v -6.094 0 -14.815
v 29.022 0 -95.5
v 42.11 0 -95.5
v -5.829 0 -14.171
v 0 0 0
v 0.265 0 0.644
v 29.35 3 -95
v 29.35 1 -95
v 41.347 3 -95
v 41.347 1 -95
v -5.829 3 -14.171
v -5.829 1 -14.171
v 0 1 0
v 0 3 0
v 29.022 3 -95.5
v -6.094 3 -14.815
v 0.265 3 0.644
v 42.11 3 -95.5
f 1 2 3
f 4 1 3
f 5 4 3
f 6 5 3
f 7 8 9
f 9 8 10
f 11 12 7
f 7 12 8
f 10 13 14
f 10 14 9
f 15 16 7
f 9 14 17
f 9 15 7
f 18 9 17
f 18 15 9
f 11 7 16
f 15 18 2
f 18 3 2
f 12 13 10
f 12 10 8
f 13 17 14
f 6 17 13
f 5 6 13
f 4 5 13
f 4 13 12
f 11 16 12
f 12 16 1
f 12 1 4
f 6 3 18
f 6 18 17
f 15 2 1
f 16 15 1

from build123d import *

# Parameters (mm, degrees)
EXTRUDE_1_DEPTH      = 1
EXTRUDE_2_DEPTH      = 2
EXTRUDE_2_DEPTH_BACK = 1
EXTRUDE_4_DEPTH      = 2
EXTRUDE_4_DEPTH_BACK = 1
EXTRUDE_5_DEPTH      = 2


with BuildPart() as part:
    # 草圖1 → 填料-伸長1 (new body)
    with BuildSketch(Plane(origin=(0, 0, 0), x_dir=(1, 0, 0), z_dir=(0, 1, 0))):
        Polygon((0, 0), (-5.8291827, 14.170729157), (29.567552432, 95.5), (41.564226141, 95.5), align=None)
    extrude(amount=EXTRUDE_1_DEPTH)



with BuildPart() as body_2:
    # 草圖2 → 填料-伸長2 (new, two sides: drawn at the far end of the back side and taken through both)
    with BuildSketch(Plane(origin=(0, 1, 0), x_dir=(1, 0, 0), z_dir=(0, 1, 0)).offset(-EXTRUDE_2_DEPTH_BACK)):
        Polygon((0, 0), (41.564226141, 95.5), (42.109529491, 95.5), (0.26496285, -0.644124053), align=None)
    extrude(amount=EXTRUDE_2_DEPTH + EXTRUDE_2_DEPTH_BACK)


with BuildPart() as part_1:
    add(part.part)

    add(body_2.part)  # 填料-伸長4 merges body 2
    # 草圖2<4> → 填料-伸長4 (add, two sides: drawn at the far end of the back side and taken through both)
    with BuildSketch(Plane(origin=(0, 1, 0), x_dir=(1, 0, 0), z_dir=(0, 1, 0)).offset(-EXTRUDE_4_DEPTH_BACK)):
        Polygon((-5.8291827, 14.170729157), (29.567552432, 95.5), (29.022249082, 95.5), (-6.09414555, 14.81485321), align=None)
    extrude(amount=EXTRUDE_4_DEPTH + EXTRUDE_4_DEPTH_BACK)

    # 草圖7 → 填料-伸長5 (add)
    with BuildSketch(Plane(origin=(0, 1, 0), x_dir=(1, 0, 0), z_dir=(0, 1, 0))):
        Polygon((41.564226141, 95.5), (29.567552432, 95.5), (29.349938683, 95), (41.346612391, 95), align=None)
    extrude(amount=EXTRUDE_5_DEPTH)


solid = part_1.part
